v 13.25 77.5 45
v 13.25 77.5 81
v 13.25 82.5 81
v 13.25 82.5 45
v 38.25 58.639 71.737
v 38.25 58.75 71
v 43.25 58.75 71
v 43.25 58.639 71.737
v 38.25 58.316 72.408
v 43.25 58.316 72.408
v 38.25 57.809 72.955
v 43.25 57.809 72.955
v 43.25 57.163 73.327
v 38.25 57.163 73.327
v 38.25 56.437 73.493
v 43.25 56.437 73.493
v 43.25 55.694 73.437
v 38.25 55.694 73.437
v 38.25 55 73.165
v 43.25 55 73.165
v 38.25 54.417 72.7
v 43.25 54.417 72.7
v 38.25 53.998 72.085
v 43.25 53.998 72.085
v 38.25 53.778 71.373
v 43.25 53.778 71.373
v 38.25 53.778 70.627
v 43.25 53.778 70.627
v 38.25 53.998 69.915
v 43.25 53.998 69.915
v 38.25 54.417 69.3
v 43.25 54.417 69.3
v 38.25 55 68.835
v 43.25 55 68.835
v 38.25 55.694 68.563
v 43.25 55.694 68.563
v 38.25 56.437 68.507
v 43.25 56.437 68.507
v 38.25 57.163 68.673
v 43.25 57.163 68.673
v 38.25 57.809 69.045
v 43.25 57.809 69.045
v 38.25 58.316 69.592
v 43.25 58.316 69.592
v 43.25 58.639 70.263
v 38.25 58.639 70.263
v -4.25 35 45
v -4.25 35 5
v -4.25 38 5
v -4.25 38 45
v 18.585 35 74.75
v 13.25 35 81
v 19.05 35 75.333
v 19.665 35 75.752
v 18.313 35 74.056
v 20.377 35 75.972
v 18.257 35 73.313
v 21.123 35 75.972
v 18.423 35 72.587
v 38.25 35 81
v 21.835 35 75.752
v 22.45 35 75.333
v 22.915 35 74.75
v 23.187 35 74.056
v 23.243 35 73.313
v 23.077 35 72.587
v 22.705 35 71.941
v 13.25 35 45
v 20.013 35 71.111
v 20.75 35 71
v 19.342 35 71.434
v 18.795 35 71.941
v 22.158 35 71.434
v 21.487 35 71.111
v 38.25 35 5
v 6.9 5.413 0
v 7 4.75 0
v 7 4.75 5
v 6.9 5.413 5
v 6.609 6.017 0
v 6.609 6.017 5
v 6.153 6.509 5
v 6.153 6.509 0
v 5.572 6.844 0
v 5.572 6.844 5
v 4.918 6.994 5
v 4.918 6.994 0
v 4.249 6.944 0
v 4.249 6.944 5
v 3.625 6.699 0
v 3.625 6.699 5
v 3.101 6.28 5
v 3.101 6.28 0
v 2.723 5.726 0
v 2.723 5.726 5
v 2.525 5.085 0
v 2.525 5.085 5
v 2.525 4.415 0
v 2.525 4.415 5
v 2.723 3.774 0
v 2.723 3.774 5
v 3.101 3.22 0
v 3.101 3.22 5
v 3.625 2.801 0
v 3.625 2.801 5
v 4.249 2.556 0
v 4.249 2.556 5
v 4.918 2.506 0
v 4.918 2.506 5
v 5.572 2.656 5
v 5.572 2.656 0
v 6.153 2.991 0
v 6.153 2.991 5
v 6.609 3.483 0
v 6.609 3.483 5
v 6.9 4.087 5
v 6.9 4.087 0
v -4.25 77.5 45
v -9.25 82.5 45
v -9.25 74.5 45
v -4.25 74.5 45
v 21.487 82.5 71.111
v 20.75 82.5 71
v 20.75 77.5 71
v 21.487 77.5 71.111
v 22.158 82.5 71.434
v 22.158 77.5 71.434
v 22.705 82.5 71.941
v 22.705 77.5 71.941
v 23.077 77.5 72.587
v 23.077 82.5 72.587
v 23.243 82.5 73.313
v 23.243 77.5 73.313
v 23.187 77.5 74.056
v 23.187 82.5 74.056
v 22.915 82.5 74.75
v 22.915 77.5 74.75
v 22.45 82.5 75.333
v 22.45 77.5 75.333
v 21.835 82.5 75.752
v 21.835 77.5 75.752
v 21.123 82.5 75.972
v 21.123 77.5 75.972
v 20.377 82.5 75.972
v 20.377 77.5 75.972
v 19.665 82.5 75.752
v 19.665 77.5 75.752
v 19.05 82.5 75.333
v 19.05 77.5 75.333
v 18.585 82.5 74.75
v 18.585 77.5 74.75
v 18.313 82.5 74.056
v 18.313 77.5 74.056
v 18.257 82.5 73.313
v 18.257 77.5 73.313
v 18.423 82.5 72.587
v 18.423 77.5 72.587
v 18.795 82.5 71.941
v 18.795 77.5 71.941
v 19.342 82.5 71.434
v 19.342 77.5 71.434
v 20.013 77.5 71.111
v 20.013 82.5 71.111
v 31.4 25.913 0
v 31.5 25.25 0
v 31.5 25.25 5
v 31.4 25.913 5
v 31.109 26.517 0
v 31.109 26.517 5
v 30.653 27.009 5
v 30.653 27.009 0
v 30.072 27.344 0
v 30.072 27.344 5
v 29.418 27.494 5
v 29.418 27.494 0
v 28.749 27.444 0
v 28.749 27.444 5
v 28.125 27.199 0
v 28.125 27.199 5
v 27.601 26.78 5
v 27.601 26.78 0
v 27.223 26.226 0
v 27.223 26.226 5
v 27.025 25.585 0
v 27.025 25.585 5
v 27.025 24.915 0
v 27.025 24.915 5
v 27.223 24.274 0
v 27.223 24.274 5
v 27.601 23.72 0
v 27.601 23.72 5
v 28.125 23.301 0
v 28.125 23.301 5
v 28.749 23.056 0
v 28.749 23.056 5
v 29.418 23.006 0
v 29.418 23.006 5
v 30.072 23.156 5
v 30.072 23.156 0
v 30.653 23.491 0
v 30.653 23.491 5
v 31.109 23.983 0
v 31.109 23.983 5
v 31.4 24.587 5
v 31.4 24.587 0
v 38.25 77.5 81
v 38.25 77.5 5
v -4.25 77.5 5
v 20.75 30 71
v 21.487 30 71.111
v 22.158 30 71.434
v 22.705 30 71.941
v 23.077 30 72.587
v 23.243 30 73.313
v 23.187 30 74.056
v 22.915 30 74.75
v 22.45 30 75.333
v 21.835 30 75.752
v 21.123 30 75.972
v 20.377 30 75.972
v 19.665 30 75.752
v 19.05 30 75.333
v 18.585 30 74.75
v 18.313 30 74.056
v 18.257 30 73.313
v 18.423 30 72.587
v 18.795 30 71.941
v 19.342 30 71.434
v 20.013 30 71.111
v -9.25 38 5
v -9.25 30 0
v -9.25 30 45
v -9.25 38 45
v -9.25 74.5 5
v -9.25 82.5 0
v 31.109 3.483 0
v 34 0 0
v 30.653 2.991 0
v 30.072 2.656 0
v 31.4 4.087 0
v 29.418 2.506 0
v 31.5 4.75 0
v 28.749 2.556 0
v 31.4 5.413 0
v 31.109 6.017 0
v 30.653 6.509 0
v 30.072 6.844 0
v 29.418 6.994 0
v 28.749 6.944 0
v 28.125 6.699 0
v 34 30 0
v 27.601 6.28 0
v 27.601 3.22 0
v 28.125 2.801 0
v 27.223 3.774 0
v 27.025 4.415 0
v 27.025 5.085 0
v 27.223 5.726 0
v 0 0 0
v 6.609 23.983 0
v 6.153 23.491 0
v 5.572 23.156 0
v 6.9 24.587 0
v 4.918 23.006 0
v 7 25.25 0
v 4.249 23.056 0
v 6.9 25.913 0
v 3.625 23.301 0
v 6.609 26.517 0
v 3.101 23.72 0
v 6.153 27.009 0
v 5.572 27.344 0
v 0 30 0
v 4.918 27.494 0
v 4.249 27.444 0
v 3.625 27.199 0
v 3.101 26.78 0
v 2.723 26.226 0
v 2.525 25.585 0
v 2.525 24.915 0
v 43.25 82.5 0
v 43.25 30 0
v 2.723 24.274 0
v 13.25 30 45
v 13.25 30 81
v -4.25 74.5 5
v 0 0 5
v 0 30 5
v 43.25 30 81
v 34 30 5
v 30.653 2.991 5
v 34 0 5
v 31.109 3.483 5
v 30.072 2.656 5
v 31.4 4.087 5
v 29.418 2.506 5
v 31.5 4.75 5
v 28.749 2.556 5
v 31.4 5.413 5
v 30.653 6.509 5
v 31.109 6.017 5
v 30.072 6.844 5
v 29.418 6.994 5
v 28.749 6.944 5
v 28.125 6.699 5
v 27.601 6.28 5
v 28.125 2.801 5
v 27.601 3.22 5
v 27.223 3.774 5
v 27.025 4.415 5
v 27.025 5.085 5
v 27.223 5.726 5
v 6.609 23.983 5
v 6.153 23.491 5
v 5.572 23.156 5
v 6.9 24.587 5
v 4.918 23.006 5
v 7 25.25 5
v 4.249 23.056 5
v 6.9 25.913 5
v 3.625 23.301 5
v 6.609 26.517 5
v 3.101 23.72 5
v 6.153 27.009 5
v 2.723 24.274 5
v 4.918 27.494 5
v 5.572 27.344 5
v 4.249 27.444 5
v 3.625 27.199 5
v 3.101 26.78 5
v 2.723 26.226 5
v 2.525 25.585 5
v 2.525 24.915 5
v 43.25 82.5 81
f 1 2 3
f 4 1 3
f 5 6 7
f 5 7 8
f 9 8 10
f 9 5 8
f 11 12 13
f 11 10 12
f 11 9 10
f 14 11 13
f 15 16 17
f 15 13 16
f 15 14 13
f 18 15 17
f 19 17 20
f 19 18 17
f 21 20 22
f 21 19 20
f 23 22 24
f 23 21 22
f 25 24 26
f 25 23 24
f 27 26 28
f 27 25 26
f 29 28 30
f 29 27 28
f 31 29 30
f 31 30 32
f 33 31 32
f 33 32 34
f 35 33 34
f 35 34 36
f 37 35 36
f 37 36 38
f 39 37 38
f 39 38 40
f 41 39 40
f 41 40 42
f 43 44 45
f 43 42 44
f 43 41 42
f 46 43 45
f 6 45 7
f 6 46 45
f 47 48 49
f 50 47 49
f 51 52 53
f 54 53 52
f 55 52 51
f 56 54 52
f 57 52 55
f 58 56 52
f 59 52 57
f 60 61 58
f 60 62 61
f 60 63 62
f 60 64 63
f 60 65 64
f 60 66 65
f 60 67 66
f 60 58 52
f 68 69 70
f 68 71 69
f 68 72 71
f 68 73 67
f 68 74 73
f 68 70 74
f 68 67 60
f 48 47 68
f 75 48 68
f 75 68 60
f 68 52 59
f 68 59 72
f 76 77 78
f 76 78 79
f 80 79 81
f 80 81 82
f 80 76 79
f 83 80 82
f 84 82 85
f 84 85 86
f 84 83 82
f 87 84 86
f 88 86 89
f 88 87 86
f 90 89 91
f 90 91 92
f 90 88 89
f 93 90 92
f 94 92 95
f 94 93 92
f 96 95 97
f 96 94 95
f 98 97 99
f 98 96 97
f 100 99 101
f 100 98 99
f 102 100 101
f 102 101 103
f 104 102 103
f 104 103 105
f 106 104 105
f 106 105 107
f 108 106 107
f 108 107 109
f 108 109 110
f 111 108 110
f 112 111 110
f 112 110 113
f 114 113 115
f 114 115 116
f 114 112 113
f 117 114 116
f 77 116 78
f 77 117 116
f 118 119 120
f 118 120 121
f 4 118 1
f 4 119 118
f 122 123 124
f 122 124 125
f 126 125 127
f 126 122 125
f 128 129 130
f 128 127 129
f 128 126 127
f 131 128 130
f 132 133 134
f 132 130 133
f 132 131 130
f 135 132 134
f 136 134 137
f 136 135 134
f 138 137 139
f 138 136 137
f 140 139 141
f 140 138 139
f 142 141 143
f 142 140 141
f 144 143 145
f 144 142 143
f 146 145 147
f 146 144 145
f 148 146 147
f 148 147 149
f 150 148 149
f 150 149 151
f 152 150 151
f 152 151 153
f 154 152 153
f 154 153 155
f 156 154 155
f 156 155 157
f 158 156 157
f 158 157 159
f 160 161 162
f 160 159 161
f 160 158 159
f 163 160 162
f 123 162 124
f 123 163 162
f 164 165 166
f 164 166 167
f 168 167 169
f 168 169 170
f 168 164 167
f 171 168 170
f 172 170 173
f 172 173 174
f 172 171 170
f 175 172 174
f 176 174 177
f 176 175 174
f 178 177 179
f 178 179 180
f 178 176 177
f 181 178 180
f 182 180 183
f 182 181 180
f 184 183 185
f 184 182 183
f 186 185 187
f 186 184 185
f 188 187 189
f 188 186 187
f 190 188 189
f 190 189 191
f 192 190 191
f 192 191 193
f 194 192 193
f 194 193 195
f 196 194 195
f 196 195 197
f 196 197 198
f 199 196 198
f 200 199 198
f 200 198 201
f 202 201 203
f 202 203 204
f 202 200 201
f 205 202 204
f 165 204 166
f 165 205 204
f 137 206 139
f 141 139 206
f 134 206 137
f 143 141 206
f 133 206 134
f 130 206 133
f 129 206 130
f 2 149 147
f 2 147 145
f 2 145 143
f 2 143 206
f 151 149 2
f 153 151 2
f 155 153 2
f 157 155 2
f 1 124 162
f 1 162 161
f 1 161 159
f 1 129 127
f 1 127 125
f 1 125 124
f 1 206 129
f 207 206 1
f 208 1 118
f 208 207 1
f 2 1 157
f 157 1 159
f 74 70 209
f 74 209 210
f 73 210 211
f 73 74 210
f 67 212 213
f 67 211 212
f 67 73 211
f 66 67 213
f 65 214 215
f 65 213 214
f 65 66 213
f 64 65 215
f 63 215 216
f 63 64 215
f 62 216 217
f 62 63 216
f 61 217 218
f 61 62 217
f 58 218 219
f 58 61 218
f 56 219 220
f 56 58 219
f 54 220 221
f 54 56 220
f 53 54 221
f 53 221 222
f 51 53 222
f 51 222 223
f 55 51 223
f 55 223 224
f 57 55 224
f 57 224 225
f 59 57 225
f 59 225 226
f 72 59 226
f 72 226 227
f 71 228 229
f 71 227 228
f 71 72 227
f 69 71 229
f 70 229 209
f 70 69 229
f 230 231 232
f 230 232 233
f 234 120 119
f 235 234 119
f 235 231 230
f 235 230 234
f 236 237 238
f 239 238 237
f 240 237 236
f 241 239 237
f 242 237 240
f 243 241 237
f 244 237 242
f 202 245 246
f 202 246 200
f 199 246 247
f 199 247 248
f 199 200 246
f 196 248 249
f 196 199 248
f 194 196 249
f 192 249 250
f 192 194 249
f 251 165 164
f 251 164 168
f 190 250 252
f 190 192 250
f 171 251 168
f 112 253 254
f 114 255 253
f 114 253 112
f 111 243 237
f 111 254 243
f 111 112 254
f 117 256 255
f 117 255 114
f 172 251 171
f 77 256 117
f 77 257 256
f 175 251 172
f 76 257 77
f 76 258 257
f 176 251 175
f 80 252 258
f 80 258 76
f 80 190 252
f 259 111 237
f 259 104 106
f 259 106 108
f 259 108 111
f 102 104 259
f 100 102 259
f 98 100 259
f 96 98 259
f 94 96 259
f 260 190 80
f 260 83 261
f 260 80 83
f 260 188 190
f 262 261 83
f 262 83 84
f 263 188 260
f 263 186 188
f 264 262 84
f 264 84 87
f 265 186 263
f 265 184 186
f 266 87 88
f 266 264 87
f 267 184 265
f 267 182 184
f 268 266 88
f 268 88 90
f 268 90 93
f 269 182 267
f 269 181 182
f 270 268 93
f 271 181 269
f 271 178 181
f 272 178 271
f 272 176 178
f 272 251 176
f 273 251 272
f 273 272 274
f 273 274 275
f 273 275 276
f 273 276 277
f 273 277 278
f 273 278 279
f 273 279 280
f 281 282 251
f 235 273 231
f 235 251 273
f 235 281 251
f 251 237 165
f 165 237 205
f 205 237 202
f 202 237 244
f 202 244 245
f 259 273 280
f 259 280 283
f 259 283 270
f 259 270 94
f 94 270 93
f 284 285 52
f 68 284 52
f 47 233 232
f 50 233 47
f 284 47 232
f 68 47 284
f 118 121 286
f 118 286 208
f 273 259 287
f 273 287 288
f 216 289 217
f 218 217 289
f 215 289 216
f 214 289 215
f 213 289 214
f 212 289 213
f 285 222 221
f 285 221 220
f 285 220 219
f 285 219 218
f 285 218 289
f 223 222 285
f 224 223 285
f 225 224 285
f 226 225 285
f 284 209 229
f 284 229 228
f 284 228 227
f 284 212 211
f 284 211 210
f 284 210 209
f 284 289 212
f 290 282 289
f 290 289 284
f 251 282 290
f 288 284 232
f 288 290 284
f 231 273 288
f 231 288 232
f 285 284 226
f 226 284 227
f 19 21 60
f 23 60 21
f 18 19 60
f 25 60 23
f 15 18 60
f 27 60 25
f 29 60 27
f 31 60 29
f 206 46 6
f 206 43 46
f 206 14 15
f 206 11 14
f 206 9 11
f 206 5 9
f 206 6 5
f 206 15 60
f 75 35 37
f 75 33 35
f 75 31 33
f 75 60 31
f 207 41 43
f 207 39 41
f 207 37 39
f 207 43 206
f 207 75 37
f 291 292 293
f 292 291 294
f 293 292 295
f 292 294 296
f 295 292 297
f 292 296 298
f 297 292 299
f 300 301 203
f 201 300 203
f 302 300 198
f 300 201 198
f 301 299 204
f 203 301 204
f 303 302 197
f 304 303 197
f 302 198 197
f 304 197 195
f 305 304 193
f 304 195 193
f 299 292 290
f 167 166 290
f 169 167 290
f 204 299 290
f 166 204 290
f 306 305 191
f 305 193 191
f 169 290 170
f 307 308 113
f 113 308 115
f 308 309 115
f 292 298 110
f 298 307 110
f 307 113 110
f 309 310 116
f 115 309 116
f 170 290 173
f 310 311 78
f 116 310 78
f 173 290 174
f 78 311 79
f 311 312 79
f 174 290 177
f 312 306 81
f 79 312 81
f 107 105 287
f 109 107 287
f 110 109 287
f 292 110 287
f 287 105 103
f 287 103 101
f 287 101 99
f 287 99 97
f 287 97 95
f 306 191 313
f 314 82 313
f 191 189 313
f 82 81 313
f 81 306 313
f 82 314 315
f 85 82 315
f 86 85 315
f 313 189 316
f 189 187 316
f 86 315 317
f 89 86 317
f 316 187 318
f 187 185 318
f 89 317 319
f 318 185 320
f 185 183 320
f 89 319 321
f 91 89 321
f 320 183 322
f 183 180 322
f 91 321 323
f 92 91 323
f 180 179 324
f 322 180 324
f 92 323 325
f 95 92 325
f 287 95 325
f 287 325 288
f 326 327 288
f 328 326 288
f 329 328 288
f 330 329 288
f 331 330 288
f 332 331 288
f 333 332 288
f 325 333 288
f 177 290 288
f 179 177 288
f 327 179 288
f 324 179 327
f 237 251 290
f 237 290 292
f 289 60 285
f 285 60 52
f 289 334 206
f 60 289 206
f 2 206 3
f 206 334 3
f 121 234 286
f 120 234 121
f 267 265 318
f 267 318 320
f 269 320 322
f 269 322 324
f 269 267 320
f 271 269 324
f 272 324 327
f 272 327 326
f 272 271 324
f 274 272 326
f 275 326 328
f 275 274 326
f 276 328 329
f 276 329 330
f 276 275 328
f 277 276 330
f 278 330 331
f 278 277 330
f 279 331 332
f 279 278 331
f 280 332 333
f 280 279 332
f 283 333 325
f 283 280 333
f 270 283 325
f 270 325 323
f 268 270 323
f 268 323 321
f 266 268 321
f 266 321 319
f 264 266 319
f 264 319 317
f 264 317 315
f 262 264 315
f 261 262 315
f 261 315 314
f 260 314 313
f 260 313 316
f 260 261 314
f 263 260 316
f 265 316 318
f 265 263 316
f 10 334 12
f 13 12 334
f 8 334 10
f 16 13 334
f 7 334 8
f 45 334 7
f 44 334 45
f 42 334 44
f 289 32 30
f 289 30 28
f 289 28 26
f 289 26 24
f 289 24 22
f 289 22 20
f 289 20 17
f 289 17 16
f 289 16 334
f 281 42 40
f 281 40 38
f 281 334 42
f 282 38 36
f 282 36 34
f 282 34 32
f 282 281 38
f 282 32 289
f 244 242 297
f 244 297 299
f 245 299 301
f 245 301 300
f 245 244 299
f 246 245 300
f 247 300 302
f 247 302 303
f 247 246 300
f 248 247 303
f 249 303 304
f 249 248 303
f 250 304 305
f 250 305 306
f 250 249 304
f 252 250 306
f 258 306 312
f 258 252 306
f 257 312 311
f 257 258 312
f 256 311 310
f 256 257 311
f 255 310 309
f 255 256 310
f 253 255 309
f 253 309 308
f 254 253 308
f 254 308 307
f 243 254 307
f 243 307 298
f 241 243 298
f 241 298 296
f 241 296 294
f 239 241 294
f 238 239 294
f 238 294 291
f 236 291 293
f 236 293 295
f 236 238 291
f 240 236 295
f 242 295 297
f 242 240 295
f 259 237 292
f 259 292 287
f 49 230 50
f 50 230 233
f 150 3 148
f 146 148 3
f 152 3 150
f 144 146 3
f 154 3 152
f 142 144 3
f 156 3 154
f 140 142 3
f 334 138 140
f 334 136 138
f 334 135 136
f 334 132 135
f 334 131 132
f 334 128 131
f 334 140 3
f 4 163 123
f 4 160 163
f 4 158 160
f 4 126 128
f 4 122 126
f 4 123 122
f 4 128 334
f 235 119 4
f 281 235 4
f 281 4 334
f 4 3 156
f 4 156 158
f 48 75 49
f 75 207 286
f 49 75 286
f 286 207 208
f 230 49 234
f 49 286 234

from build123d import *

# Parameters (mm, degrees)
SKETCH1_R               = 2.25
BOSS_EXTRUDE1_DEPTH     = 5
SKETCH2_W               = 52.5
SKETCH2_H               = 52.5
SKETCH2_W_2             = 42.5
SKETCH2_H_2             = 42.5
BOSS_EXTRUDE2_DEPTH     = 40
BOSS_EXTRUDE3_DEPTH     = 36
CUT_EXTRUDE2_DEPTH      = 121.157448791
CUT_EXTRUDE2_DEPTH_BACK = 121.157448791
SKETCH6_R               = 2.5
CUT_EXTRUDE3_DEPTH      = 127.97834461
CUT_EXTRUDE3_DEPTH_BACK = 127.97834461
SKETCH7_R               = 2.5
SKETCH8_W               = 40
SKETCH8_H               = 36.5
CUT_EXTRUDE4_DEPTH      = 24


with BuildPart() as part:
    # Sketch1 → Boss-Extrude1 (new body)
    with BuildSketch(Plane.XY):
        Polygon((0, 30), (-9.25, 30), (-9.25, 82.5), (43.25, 82.5), (43.25, 30), (34, 30), (34, 0), (0, 0), align=None)
        with Locations((4.75, 25.25)):
            Circle(SKETCH1_R, mode=Mode.SUBTRACT)
        with Locations((29.25, 25.25)):
            Circle(SKETCH1_R, mode=Mode.SUBTRACT)
        with Locations((29.25, 4.75)):
            Circle(SKETCH1_R, mode=Mode.SUBTRACT)
        with Locations((4.75, 4.75)):
            Circle(SKETCH1_R, mode=Mode.SUBTRACT)
    extrude(amount=BOSS_EXTRUDE1_DEPTH)

    # Sketch2 → Boss-Extrude2 (add)
    with BuildSketch(Plane.XY.offset(5)):
        with Locations((17, 56.25)):
            Rectangle(SKETCH2_W, SKETCH2_H)
        with Locations((17, 56.25)):
            Rectangle(SKETCH2_W_2, SKETCH2_H_2, mode=Mode.SUBTRACT)
    extrude(amount=BOSS_EXTRUDE2_DEPTH)

    # Sketch5 → Boss-Extrude3 (add)
    with BuildSketch(Plane.XY.offset(45)):
        Polygon((43.25, 82.5), (43.25, 30), (13.25, 30), (13.25, 35), (38.25, 35), (38.25, 77.5), (13.25, 77.5), (13.25, 82.5), align=None)
    extrude(amount=BOSS_EXTRUDE3_DEPTH)

    # Sketch6 → Cut-Extrude2 (cut, two sides: drawn at the far end of the back side and taken through both)
    with BuildSketch(Plane.XZ.offset(-77.5).offset(-CUT_EXTRUDE2_DEPTH_BACK)):
        with Locations(Location((20.75, 73.5, 0), (0, 0, 270))):
            Circle(SKETCH6_R)
    extrude(amount=CUT_EXTRUDE2_DEPTH + CUT_EXTRUDE2_DEPTH_BACK, mode=Mode.SUBTRACT)

    # Sketch7 → Cut-Extrude3 (cut, two sides: drawn at the far end of the back side and taken through both)
    with BuildSketch(Plane(origin=(43.25, 0, 0), x_dir=(0, 0, -1), z_dir=(1, 0, 0)).offset(-CUT_EXTRUDE3_DEPTH_BACK)):
        with Locations(Location((-71, 56.25, 0), (0, 0, 90))):
            Circle(SKETCH7_R)
    extrude(amount=CUT_EXTRUDE3_DEPTH + CUT_EXTRUDE3_DEPTH_BACK, mode=Mode.SUBTRACT)

    # Sketch8 → Cut-Extrude4 (cut)
    with BuildSketch(Plane.ZY.offset(9.25)):
        with Locations((25, 56.25)):
            Rectangle(SKETCH8_W, SKETCH8_H)
    extrude(amount=-CUT_EXTRUDE4_DEPTH, mode=Mode.SUBTRACT)


solid = part.part
